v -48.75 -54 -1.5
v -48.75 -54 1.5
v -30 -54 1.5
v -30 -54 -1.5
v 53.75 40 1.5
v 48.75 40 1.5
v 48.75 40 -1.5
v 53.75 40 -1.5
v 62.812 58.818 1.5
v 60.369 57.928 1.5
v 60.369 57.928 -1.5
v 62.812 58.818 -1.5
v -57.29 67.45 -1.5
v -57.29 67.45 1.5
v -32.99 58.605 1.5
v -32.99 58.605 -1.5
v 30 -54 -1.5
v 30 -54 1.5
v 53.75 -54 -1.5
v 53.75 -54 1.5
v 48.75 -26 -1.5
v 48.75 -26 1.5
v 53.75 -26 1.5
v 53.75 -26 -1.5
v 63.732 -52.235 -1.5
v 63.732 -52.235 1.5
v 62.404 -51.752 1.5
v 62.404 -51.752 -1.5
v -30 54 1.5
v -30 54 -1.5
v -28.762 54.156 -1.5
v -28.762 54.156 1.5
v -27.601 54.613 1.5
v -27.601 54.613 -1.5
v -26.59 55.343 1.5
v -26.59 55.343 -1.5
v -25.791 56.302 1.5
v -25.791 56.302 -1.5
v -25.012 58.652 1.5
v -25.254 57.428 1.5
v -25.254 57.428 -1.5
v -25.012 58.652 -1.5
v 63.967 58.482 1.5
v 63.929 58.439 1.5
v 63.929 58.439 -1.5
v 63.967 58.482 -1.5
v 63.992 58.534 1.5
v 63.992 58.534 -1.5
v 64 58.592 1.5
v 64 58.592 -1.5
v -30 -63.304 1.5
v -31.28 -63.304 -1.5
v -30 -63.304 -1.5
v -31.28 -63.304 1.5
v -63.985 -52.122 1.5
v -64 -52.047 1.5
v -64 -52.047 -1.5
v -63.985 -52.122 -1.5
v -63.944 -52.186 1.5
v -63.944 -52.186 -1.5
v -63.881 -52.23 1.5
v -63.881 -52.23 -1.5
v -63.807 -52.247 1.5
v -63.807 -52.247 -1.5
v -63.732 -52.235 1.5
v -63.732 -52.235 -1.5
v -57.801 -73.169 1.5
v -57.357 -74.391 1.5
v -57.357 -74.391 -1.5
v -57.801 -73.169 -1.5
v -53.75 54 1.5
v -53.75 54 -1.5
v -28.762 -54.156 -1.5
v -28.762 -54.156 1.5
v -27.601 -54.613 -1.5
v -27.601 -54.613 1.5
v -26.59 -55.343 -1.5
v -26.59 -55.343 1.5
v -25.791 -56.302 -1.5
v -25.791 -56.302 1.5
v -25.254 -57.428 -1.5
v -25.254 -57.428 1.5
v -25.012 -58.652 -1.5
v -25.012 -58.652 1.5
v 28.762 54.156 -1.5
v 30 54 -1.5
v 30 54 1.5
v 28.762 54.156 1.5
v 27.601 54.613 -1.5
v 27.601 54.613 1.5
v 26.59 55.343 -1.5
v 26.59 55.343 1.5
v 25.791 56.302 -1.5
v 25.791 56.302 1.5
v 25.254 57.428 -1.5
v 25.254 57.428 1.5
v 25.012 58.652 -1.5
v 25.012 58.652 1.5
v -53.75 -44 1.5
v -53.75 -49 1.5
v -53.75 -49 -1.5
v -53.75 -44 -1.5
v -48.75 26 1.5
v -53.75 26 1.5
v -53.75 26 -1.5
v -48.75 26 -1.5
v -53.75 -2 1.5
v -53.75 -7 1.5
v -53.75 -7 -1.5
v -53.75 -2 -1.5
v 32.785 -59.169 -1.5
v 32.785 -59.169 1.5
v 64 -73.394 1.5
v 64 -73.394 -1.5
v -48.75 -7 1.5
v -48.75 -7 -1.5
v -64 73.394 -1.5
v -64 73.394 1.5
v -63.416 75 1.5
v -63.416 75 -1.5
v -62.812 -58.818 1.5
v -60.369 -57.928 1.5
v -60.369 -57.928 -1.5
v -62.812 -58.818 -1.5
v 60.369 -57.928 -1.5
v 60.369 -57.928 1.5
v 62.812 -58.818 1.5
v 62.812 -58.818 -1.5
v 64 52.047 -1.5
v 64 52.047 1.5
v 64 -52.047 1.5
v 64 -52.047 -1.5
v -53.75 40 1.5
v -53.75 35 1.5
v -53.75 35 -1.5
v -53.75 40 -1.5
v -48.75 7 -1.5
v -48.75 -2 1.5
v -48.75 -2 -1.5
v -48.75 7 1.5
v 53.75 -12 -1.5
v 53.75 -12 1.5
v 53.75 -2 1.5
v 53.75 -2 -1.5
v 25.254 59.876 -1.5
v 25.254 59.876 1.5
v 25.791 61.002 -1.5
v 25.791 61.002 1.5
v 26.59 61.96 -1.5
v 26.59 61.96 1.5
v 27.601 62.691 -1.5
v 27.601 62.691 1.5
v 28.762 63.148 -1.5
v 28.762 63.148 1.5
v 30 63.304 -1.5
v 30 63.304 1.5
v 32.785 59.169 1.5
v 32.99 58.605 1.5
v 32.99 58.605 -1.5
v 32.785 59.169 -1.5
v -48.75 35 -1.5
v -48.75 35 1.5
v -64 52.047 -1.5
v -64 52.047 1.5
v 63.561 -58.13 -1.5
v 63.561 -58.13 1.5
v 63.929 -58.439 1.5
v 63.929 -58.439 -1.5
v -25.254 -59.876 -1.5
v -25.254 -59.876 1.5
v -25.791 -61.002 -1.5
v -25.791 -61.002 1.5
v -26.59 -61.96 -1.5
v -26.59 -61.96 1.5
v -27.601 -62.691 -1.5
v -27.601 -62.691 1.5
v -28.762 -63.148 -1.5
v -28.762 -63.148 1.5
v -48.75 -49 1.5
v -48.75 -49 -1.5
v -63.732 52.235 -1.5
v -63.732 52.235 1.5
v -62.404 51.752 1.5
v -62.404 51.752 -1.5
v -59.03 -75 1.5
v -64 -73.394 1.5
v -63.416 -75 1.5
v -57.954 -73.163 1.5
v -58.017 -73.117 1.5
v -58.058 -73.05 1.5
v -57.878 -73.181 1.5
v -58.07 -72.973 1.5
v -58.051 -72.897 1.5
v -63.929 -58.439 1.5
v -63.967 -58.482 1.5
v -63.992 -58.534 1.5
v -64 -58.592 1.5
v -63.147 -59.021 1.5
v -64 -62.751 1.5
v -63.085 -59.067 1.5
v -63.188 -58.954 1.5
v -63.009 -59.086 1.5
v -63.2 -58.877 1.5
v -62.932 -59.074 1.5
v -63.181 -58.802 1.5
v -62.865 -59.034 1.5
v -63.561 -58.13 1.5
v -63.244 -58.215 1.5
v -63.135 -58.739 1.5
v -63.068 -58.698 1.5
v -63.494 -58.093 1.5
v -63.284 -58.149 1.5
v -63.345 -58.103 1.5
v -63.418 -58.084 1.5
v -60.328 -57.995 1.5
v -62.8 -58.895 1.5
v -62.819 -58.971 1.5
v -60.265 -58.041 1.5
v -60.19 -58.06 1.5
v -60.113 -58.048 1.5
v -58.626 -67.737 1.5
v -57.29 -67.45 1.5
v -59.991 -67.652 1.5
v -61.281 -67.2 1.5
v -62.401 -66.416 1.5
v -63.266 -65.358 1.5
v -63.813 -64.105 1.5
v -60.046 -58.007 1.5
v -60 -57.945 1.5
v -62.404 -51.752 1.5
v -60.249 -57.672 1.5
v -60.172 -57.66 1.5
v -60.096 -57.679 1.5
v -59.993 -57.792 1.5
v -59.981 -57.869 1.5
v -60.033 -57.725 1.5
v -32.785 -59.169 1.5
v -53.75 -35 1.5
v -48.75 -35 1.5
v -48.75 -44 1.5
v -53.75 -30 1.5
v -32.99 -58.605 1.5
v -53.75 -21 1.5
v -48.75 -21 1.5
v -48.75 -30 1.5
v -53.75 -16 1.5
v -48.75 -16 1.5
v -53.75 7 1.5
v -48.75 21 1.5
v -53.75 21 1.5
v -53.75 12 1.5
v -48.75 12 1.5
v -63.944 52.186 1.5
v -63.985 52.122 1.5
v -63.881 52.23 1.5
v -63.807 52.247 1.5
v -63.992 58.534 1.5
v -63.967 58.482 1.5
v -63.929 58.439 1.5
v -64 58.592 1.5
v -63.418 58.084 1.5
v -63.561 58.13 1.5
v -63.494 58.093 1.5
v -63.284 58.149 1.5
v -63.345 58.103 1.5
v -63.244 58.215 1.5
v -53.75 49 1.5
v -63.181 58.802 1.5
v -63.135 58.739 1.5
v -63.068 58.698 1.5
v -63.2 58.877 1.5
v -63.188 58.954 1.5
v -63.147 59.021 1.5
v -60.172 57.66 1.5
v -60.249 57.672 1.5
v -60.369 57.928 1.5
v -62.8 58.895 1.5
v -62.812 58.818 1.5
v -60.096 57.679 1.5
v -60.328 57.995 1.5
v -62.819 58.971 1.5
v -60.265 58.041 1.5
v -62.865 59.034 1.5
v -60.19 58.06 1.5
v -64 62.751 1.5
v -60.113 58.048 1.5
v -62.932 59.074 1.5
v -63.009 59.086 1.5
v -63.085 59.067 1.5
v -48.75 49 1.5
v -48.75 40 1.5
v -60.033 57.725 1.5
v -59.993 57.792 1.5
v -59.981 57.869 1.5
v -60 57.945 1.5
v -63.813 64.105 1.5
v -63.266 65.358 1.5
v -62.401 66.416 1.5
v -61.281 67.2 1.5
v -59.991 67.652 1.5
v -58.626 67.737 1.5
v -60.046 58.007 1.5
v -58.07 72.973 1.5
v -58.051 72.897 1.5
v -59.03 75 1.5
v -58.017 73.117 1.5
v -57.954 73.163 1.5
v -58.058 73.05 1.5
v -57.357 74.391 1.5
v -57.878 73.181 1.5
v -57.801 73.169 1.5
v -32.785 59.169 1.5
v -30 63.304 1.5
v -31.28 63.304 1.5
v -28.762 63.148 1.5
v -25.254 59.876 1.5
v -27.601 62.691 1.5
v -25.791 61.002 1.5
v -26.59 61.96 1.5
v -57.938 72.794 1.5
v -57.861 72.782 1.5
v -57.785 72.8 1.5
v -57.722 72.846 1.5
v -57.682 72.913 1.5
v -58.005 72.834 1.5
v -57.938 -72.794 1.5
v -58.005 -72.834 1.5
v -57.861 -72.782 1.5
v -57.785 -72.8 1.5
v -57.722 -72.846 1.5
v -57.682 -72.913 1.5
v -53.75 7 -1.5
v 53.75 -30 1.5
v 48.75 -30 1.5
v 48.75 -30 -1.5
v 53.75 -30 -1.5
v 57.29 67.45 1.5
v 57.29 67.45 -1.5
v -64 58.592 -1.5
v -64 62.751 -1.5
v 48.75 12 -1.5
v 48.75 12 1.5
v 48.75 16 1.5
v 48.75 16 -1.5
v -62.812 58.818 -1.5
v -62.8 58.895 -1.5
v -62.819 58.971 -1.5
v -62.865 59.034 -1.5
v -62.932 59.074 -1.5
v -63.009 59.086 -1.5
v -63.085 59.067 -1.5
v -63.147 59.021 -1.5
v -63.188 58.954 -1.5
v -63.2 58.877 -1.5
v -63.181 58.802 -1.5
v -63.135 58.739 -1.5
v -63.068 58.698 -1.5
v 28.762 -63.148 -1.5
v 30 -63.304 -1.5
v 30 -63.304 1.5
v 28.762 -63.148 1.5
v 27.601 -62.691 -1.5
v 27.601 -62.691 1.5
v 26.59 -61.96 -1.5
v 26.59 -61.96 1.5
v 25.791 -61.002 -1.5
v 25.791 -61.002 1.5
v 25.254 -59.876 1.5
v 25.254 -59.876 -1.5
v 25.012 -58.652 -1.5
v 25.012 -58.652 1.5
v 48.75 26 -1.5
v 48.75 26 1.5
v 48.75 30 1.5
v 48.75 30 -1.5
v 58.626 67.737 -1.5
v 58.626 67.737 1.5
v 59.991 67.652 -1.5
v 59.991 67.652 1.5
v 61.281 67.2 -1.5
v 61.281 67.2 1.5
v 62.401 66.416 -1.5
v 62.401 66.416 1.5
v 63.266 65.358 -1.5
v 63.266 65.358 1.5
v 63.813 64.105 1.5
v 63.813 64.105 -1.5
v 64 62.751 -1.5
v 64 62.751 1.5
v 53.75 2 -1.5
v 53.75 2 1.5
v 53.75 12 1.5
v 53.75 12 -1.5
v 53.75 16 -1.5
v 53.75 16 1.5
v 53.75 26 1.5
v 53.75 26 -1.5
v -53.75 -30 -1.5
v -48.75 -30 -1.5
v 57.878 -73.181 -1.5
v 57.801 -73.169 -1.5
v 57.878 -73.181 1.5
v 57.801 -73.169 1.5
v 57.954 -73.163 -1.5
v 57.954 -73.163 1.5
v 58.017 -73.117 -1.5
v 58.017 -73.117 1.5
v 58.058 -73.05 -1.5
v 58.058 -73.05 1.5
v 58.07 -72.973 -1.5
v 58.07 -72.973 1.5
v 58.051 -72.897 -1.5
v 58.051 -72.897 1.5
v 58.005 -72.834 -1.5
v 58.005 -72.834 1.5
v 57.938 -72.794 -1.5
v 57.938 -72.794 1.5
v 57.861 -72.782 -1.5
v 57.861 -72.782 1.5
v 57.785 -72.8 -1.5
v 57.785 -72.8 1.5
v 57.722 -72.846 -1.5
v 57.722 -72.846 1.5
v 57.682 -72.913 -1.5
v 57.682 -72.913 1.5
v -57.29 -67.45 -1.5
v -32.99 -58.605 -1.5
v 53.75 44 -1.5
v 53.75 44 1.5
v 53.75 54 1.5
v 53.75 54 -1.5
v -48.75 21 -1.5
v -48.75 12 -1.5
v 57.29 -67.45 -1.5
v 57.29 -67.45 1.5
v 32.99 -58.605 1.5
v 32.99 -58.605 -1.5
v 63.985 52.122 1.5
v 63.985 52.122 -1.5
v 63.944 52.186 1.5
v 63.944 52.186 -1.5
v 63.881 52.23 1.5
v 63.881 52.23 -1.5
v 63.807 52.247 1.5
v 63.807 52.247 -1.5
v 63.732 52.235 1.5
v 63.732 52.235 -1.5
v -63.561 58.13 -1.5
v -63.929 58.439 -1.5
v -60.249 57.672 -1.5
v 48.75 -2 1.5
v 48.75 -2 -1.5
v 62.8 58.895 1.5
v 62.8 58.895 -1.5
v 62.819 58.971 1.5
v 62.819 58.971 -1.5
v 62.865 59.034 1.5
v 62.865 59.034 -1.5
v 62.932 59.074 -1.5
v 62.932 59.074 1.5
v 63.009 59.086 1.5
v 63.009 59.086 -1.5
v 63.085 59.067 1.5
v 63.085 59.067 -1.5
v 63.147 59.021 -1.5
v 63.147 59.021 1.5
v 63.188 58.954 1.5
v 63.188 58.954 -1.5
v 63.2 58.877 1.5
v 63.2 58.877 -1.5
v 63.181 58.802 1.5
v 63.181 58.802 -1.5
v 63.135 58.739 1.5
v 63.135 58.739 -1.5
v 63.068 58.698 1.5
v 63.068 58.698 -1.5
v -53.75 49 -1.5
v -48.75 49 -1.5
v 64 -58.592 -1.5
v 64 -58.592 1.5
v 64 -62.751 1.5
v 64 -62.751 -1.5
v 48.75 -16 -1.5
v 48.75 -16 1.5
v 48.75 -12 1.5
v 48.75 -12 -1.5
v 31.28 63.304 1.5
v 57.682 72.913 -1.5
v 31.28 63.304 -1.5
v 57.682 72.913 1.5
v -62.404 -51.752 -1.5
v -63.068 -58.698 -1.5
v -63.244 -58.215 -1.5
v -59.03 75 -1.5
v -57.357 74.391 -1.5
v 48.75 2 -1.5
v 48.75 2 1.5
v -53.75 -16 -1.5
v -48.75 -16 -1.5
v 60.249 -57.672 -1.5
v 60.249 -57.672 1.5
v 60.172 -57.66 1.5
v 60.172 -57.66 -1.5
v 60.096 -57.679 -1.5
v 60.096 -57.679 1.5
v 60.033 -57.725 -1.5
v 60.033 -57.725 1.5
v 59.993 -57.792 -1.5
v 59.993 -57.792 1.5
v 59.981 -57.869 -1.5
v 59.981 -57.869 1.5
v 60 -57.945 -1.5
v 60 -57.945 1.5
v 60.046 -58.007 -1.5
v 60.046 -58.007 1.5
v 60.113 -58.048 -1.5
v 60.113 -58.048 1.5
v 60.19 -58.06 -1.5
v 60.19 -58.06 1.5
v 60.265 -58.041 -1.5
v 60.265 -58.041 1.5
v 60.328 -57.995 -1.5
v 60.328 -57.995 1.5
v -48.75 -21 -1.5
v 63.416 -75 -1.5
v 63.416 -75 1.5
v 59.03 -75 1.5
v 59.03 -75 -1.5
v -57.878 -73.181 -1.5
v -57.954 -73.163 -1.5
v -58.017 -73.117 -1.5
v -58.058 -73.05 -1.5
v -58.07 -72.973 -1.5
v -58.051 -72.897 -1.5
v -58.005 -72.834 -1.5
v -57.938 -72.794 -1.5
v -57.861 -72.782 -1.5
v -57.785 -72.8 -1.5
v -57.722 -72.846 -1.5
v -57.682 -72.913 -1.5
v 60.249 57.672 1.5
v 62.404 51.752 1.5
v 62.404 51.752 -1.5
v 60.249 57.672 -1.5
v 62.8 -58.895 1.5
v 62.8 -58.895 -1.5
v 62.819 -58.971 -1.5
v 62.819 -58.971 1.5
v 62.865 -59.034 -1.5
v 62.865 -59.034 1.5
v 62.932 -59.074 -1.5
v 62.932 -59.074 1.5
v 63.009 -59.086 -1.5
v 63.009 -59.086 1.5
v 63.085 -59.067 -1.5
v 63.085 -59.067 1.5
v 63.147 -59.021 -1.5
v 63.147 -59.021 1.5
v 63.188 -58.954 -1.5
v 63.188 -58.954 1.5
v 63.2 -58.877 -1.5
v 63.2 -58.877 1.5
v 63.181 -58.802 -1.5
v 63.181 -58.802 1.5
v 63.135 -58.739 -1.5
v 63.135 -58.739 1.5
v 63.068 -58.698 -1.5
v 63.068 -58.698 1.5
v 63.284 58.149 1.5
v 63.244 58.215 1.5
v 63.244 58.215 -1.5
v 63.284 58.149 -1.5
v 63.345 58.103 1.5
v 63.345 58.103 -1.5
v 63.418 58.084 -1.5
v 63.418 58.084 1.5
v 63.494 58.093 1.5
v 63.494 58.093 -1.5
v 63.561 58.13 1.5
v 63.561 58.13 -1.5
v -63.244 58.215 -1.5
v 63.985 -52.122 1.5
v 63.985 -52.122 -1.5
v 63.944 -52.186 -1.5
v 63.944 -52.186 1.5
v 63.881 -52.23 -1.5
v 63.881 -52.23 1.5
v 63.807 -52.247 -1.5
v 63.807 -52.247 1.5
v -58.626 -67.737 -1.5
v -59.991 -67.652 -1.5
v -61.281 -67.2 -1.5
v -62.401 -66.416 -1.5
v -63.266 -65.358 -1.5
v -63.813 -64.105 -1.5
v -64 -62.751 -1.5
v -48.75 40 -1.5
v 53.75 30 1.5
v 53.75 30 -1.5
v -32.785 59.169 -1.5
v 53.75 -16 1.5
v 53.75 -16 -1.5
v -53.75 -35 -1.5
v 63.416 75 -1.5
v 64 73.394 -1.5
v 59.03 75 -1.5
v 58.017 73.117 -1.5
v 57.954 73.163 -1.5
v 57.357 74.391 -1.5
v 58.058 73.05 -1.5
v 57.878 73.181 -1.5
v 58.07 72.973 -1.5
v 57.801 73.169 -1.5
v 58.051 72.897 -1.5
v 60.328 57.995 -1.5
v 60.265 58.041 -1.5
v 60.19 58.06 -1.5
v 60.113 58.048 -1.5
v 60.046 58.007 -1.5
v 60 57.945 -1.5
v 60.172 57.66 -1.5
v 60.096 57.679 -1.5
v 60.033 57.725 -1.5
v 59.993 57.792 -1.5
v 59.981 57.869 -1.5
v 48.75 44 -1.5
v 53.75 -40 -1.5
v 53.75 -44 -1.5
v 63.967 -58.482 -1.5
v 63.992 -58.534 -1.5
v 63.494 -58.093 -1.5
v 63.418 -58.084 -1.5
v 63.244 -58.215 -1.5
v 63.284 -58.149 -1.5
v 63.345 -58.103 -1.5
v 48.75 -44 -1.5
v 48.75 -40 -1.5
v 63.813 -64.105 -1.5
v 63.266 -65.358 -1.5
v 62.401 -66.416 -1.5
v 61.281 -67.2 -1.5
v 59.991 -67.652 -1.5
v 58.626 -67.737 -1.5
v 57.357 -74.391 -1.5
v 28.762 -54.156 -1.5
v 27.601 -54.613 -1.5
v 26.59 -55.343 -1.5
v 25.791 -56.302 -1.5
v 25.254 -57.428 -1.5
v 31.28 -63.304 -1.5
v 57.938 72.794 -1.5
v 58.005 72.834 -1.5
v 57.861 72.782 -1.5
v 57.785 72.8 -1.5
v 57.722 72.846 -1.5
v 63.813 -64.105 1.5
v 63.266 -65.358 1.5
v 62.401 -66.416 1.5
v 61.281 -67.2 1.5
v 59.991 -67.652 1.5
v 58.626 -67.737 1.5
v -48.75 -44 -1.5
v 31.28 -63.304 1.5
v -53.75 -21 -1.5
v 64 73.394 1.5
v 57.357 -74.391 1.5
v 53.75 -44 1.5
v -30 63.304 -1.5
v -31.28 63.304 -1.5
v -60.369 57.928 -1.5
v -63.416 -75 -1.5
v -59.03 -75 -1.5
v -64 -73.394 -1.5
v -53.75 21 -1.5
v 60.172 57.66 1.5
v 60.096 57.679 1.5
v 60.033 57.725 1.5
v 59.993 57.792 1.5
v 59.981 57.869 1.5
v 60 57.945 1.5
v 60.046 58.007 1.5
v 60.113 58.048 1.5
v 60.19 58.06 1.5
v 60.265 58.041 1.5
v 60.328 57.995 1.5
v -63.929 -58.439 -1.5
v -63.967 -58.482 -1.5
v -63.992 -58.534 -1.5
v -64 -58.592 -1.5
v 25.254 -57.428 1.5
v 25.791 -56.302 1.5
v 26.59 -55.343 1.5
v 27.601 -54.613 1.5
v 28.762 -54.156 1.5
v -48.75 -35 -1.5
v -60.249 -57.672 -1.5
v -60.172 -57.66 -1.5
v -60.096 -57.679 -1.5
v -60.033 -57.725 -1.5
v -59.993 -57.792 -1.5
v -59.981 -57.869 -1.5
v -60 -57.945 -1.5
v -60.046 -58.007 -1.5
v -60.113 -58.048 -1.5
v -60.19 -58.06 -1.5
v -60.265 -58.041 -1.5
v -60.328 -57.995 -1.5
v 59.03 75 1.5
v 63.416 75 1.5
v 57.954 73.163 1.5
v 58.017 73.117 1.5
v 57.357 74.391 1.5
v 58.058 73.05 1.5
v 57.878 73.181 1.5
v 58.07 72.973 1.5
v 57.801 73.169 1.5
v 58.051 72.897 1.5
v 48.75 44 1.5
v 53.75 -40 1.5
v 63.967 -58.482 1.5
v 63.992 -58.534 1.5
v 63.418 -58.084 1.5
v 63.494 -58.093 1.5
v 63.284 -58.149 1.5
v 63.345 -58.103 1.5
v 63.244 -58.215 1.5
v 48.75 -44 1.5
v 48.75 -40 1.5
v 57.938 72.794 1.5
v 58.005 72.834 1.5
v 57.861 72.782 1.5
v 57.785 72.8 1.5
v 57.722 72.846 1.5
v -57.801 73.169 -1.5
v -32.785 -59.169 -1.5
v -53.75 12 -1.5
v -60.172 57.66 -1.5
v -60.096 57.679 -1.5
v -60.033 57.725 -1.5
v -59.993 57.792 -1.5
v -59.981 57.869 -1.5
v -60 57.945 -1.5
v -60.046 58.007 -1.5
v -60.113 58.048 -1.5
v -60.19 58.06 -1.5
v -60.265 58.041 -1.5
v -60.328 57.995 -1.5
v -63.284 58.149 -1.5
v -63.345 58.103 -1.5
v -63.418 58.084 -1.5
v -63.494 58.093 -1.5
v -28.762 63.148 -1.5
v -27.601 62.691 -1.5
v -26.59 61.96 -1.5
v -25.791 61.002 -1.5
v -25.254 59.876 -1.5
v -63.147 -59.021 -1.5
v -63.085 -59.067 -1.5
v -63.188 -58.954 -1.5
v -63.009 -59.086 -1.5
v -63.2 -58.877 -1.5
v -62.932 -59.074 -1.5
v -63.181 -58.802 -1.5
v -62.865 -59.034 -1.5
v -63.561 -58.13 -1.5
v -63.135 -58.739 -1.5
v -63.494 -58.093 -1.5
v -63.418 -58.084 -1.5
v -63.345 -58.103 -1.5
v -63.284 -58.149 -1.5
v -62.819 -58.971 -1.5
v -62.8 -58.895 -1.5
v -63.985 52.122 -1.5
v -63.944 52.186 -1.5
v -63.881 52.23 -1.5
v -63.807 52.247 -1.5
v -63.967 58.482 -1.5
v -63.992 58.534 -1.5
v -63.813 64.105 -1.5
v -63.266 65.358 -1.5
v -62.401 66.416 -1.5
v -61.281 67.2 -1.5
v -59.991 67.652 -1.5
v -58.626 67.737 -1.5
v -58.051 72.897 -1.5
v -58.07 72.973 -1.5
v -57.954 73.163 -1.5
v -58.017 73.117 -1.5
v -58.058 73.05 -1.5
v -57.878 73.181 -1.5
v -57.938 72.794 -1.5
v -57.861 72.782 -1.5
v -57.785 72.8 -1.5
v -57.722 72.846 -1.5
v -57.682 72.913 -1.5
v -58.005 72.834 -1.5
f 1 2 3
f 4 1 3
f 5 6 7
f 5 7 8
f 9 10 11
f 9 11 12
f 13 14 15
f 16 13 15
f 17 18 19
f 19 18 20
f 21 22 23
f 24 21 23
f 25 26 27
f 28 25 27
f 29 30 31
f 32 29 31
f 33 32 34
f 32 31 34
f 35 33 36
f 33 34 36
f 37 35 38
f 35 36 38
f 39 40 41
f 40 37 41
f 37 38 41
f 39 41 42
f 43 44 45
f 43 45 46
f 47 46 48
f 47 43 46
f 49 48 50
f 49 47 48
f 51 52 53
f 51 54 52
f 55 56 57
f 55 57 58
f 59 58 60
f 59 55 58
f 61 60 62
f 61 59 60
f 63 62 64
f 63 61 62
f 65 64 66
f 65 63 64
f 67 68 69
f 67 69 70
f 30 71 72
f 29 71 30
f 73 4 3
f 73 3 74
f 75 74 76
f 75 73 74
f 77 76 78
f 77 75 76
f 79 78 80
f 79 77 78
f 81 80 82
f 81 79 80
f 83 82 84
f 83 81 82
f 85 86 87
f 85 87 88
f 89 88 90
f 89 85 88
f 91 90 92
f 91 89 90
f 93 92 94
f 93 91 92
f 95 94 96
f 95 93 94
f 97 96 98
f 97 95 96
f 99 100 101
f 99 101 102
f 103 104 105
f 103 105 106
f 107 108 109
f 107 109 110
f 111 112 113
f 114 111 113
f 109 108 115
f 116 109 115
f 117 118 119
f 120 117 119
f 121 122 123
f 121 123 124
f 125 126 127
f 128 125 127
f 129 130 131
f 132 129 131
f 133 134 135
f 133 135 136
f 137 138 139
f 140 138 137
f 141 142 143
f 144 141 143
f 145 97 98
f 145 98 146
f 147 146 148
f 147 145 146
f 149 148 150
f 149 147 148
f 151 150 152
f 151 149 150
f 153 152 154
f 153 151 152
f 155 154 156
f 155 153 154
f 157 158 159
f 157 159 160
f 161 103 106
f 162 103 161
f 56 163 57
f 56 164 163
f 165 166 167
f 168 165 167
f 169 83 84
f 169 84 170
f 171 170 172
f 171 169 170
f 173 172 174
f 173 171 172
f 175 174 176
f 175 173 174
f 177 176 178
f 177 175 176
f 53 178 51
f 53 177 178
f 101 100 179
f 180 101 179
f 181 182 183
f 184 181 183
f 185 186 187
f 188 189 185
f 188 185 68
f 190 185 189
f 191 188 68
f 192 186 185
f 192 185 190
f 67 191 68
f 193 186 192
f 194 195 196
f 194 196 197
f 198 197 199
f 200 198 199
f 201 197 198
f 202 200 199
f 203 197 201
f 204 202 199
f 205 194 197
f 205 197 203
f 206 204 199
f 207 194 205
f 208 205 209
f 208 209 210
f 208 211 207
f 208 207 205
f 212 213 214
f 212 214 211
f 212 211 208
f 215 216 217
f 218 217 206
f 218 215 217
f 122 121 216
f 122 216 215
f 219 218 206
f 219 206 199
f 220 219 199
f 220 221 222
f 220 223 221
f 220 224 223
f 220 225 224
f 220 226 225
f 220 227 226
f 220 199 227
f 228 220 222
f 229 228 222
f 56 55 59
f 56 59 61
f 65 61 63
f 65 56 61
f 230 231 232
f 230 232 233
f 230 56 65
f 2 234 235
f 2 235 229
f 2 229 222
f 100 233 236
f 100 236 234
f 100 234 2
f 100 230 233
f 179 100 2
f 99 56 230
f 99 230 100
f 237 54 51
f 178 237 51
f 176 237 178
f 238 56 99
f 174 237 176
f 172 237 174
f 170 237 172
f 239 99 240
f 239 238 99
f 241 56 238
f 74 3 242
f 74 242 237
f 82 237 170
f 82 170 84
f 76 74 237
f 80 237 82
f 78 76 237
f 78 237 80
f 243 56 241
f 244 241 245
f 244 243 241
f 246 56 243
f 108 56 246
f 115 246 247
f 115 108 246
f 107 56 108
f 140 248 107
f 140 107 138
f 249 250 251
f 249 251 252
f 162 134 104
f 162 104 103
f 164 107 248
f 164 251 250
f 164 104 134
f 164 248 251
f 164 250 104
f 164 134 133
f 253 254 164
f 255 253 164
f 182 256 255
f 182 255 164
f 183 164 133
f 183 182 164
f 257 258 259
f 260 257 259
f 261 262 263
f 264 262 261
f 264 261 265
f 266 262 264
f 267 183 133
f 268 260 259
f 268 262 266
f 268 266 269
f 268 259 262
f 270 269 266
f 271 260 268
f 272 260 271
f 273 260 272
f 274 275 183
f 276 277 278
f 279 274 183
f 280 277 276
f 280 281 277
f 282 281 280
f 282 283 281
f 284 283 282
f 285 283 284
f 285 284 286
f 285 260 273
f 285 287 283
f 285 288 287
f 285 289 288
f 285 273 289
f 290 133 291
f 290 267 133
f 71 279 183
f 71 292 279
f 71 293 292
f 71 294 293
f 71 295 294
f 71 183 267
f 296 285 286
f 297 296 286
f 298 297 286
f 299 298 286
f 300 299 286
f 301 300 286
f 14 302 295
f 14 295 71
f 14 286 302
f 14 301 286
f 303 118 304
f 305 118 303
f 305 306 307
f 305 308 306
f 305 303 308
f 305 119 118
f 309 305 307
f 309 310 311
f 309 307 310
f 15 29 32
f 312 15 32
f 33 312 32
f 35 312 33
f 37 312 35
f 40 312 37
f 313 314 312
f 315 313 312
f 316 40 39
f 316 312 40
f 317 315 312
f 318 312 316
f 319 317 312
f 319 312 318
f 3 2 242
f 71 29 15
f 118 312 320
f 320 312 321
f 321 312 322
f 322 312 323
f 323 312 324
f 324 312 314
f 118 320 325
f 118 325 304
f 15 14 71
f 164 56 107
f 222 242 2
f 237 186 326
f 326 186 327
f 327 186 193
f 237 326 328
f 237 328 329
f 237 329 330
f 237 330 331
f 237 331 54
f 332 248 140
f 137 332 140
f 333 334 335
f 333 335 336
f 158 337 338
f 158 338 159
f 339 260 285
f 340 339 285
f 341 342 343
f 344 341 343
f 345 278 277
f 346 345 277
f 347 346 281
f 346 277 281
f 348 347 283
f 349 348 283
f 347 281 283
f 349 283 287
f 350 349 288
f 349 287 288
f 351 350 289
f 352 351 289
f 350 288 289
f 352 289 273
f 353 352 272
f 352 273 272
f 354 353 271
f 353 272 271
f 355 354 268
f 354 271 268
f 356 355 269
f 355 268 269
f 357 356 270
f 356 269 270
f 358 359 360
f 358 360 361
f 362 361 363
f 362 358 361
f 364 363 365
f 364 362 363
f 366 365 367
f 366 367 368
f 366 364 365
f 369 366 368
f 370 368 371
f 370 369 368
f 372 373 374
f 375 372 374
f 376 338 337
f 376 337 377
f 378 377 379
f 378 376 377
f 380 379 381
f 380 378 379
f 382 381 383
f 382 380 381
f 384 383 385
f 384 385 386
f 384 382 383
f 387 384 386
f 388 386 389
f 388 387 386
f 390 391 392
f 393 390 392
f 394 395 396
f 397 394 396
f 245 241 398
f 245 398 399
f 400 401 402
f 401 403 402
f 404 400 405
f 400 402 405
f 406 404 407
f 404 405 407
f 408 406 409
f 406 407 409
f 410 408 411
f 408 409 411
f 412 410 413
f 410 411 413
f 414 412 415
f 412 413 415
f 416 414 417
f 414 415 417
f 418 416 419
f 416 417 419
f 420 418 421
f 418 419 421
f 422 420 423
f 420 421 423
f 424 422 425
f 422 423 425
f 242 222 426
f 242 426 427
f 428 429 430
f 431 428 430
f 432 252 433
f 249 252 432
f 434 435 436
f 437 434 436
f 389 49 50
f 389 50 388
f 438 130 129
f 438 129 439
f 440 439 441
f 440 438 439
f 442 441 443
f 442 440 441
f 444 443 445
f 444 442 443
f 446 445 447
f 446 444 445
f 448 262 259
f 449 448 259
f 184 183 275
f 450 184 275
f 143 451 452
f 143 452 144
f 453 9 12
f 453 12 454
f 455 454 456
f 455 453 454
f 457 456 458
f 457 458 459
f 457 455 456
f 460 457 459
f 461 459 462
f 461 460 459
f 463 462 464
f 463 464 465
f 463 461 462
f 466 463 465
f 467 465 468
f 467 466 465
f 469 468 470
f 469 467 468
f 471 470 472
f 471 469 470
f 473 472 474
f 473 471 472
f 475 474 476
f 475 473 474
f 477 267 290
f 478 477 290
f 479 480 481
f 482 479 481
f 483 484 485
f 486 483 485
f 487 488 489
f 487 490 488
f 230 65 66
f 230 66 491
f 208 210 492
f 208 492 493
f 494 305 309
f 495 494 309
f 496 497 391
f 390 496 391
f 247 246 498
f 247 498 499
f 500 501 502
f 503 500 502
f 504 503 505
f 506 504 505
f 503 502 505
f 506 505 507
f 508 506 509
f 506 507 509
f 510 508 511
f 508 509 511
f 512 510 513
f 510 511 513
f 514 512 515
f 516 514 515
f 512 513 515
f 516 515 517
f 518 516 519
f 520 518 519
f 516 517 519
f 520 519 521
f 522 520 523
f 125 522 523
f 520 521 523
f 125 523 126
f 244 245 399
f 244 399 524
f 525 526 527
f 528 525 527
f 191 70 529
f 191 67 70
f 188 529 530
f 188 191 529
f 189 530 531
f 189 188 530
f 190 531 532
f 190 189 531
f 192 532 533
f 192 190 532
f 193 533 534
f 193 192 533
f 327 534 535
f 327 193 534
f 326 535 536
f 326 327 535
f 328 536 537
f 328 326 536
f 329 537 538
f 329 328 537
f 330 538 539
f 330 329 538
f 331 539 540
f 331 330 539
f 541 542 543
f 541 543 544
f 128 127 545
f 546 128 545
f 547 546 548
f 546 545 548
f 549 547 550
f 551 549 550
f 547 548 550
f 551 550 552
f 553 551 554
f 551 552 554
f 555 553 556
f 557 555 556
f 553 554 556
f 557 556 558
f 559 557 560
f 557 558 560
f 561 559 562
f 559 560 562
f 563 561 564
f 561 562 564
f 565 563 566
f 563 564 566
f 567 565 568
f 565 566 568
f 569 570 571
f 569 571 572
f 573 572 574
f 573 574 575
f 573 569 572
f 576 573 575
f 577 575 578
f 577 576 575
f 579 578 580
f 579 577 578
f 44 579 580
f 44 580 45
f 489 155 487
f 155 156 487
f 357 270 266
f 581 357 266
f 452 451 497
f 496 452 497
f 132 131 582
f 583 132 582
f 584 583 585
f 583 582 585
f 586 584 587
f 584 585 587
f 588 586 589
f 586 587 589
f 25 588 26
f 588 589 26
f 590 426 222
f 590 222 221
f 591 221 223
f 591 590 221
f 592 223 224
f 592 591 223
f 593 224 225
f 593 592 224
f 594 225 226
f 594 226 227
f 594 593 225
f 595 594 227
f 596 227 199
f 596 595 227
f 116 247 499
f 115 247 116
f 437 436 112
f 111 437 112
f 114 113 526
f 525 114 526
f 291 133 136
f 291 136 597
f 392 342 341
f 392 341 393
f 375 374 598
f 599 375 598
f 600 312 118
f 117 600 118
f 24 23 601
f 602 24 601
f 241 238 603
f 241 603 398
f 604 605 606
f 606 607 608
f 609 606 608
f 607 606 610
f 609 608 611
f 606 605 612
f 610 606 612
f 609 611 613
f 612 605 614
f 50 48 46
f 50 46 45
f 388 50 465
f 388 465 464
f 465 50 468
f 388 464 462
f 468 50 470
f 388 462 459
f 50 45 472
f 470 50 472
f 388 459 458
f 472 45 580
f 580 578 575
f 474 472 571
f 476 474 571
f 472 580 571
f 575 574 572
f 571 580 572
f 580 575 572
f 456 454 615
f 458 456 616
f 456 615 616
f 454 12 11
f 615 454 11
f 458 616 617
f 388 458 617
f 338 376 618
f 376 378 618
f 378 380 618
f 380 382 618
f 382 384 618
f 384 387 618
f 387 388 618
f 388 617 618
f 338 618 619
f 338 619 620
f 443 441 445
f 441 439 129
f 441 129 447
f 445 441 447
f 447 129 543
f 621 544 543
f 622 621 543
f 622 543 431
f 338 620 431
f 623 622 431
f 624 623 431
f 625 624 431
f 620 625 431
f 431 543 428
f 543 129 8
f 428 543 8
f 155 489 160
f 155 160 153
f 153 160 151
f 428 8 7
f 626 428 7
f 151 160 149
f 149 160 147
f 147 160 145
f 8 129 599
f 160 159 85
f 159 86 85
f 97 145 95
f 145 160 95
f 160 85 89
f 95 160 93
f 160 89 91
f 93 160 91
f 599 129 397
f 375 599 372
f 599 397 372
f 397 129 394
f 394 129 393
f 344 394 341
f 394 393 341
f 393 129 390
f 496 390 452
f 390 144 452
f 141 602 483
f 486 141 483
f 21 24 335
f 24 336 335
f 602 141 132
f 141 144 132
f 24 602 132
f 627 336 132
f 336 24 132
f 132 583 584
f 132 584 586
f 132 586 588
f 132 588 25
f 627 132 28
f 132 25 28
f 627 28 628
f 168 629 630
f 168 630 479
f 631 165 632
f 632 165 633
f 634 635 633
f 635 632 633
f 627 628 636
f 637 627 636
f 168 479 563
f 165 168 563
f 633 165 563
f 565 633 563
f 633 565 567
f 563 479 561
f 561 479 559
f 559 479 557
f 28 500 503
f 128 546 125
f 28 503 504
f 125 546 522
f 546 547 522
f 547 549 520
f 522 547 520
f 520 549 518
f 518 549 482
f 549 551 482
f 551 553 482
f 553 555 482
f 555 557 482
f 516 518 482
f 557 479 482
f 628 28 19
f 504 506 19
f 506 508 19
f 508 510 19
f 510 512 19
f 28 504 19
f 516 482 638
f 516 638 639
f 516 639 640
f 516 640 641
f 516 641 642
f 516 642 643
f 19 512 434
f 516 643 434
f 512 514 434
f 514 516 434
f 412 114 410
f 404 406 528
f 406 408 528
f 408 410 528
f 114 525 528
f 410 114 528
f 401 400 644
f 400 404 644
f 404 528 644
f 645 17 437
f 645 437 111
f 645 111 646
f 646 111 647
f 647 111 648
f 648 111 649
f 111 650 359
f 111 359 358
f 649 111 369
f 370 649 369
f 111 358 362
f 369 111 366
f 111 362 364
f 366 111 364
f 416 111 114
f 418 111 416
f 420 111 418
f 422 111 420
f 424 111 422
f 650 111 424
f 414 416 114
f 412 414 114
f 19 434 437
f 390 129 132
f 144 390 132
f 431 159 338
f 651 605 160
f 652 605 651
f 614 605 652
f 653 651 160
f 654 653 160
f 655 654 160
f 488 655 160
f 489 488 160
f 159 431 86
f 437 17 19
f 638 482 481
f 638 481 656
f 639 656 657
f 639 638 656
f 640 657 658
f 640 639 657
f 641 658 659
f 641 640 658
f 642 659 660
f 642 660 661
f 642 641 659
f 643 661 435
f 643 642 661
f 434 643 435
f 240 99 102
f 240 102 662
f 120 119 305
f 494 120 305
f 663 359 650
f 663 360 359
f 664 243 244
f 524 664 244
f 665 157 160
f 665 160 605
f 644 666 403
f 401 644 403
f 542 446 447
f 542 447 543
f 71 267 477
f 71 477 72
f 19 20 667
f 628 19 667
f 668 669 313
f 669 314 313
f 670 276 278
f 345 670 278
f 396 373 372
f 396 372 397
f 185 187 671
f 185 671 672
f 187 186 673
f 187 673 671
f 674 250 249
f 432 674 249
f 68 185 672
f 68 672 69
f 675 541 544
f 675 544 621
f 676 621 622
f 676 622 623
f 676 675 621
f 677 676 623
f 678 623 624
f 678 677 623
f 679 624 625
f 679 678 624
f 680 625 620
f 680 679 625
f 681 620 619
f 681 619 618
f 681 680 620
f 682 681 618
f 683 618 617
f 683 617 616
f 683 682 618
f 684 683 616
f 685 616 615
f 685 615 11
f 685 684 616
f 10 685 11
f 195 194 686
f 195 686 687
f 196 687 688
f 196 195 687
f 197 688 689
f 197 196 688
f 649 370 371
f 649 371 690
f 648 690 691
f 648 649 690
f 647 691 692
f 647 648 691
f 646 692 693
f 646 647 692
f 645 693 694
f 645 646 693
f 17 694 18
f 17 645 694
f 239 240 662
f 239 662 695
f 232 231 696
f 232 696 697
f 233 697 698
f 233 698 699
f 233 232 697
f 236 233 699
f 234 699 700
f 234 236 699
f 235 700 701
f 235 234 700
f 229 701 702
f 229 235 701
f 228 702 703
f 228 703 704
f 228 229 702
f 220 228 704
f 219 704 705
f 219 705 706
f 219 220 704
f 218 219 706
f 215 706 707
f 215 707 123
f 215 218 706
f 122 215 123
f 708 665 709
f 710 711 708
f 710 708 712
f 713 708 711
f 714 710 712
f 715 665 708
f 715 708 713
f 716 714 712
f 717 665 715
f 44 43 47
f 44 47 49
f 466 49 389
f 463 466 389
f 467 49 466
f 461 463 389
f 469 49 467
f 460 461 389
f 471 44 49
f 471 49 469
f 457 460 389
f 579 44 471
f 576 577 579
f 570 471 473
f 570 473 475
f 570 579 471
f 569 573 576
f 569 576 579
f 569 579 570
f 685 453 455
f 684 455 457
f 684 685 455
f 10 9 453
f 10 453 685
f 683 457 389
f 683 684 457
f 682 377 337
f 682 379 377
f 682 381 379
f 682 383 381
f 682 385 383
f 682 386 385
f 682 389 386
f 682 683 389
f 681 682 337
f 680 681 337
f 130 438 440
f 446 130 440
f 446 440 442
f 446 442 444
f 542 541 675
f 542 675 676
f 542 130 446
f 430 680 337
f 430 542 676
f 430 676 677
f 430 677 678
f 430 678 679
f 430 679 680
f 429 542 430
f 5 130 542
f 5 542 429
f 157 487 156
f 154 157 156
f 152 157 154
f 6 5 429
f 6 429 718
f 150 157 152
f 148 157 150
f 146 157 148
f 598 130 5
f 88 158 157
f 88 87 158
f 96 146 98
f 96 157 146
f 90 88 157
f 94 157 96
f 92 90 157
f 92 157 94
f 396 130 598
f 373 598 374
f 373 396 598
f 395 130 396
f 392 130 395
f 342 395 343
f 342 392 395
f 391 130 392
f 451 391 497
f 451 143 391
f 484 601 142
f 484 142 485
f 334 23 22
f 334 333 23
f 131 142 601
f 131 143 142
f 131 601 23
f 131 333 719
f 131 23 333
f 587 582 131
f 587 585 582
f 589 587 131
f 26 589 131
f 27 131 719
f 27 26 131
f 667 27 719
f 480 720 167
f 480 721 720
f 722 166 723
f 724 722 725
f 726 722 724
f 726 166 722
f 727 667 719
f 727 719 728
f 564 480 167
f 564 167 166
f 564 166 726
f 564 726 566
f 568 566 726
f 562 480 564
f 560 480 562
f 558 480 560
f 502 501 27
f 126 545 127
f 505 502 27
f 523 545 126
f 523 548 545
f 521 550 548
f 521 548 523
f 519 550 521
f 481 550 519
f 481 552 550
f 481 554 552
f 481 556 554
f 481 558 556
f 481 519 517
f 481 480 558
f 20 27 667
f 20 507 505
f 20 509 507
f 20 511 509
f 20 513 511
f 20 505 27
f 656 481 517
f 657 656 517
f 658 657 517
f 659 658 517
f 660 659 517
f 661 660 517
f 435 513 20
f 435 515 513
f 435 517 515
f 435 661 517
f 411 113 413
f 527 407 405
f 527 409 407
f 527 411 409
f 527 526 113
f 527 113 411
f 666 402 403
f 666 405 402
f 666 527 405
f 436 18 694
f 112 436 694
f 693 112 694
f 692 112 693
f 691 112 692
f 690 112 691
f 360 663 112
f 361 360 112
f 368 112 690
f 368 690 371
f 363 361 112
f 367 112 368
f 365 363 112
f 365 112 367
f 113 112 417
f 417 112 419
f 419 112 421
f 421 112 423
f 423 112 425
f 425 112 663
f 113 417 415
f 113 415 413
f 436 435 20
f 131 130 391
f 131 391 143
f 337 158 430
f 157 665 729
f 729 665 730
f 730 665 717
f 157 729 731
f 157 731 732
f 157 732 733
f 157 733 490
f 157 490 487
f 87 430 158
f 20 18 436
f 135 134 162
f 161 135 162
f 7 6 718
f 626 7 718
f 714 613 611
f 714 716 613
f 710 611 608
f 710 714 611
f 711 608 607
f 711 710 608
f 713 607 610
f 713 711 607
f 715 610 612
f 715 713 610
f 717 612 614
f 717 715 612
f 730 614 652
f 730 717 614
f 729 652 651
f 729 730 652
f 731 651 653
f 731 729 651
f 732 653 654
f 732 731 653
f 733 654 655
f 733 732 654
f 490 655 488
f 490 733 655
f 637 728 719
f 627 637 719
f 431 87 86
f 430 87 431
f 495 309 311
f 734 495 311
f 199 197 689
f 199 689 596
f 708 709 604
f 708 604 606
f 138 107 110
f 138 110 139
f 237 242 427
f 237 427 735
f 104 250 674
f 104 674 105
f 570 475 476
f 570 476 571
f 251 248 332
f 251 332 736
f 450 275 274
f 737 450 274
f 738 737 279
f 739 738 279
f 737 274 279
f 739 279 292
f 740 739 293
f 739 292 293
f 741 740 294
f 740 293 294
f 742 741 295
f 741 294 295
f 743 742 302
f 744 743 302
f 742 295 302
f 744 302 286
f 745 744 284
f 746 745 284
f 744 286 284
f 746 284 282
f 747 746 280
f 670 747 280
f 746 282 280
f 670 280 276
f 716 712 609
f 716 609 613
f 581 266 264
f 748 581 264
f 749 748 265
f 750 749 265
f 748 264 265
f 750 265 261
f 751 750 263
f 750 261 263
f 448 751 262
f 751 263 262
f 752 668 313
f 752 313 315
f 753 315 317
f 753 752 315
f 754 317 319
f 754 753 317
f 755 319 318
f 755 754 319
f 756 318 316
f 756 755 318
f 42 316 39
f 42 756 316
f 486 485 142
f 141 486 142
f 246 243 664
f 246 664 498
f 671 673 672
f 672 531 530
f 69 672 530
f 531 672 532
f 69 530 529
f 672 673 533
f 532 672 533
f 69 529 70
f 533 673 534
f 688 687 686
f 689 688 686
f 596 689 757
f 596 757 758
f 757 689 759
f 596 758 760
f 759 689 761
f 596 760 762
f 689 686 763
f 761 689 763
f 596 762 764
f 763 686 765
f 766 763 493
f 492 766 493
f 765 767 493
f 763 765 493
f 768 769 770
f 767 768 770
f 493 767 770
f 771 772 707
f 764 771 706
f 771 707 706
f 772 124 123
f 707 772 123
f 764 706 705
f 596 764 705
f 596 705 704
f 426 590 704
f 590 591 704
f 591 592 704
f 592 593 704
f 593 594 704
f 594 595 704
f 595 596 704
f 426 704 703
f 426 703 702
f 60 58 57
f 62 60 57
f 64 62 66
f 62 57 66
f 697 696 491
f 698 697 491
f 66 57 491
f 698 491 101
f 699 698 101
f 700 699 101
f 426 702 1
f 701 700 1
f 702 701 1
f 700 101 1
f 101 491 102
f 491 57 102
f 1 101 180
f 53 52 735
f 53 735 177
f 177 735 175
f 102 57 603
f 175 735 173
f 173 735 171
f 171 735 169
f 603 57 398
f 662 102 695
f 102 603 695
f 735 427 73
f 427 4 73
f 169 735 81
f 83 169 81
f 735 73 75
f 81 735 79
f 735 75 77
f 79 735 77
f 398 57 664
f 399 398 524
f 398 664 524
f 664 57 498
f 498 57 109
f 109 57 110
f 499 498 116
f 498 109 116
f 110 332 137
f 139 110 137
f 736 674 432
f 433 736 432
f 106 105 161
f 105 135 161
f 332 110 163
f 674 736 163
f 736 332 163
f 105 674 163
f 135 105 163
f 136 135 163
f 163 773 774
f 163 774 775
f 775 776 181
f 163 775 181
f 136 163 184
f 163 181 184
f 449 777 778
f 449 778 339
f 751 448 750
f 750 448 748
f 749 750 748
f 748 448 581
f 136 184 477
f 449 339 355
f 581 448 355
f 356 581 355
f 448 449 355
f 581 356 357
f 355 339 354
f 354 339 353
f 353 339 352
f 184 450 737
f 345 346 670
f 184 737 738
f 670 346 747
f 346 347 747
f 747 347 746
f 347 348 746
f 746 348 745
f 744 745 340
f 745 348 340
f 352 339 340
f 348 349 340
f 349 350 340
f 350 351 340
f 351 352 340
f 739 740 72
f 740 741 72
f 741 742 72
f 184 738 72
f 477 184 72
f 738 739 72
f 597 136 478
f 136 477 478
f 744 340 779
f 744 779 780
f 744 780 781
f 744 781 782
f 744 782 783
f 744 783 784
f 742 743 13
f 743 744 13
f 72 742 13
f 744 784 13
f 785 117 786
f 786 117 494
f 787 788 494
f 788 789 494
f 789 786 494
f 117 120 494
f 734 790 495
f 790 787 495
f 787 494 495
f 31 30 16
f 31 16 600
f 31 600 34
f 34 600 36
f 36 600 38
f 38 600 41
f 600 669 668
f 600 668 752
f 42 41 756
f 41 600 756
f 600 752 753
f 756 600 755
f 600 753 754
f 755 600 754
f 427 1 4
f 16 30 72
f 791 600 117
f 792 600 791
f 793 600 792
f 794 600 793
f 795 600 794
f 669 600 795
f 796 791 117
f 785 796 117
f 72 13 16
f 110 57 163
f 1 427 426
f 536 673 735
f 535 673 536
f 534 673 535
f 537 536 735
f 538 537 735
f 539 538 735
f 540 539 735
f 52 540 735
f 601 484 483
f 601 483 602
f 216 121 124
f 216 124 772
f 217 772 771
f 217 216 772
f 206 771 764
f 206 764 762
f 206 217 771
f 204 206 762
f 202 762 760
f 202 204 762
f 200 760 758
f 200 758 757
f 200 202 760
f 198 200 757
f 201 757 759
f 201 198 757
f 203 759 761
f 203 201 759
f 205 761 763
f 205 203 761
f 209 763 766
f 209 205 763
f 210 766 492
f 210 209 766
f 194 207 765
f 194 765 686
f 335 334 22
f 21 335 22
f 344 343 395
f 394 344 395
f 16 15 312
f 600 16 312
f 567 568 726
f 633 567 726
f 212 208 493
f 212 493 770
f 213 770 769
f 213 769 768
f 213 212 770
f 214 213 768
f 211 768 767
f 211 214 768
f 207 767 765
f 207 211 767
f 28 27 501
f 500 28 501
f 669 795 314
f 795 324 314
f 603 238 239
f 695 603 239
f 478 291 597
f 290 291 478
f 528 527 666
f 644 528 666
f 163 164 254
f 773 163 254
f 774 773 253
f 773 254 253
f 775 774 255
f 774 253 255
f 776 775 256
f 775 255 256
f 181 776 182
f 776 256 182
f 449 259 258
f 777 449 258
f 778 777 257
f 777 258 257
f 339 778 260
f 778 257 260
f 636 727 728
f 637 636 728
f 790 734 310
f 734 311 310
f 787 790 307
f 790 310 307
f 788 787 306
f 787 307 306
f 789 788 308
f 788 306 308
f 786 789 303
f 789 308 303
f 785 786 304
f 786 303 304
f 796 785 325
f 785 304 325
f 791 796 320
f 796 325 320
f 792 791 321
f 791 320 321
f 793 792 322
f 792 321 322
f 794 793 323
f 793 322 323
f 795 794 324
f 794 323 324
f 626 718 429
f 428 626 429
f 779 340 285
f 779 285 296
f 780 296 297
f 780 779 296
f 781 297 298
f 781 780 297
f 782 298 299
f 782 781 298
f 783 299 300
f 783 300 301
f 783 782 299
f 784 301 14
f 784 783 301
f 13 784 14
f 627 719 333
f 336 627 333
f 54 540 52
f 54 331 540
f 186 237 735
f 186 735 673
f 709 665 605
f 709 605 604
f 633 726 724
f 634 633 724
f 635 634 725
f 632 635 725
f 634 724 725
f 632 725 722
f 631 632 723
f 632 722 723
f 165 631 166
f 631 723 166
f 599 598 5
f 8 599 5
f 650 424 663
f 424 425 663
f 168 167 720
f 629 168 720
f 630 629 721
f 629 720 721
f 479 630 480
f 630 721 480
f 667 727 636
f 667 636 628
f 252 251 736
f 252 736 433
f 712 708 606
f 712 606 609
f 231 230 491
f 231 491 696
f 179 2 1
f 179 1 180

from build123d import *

# Parameters (mm, degrees)
F1_DEPTH        = 1.5
F4_W            = 5
F4_H            = 10
F5_DEPTH        = 3
F6_W            = 23.75
F6_H            = 108
F6_W_2          = 50
F6_H_2          = 26
F7_DEPTH        = 3
F8_W            = 5
F8_H            = 5
F9_DEPTH        = 3
F10_T1_DEPTH    = 38.7037001686
F10_T3_DEPTH    = 28
F10_S1_T1_DEPTH = 38.7037001686
F10_S1_T3_DEPTH = 28


# Not quite as in the source:
# - a fillet or chamfer that OpenCascade refuses, or shapes differently, is made with other operations: its cross-section is extruded or revolved along the edge and cut away or added
# - a feature names something its author has since deleted; it is built from what else it names


with BuildPart() as f1:
    # F0 (on Top) → F1 (new body, symmetric)
    with BuildSketch(Plane.XY):
        with BuildLine():
            Line((31.2800427974, 63.3035998776), (0, 63.3035998776))
            Line((0, 63.3035998776), (0, 0))
            Line((0, 0), (64, 0))
            Line((64, 0), (64, 52.0472386562))
            ThreePointArc((64, 52.0472386562), (63.9147152873, 52.211069065), (63.7315959713, 52.2351771803))
            Line((63.7315959713, 52.2351771803), (62.4040530693, 51.7519910793))
            Line((62.4040530693, 51.7519910793), (60.2493261663, 57.6720545902))
            ThreePointArc((60.2493261663, 57.6720545902), (59.9996605802, 57.9445167667), (60.3688606618, 57.9283971431))
            Line((60.3688606618, 57.9283971431), (62.8120614758, 58.8176495157))
            ThreePointArc((62.8120614758, 58.8176495157), (63.0845236523, 59.0673151018), (63.0684040287, 58.6981150202))
            Line((63.0684040287, 58.6981150202), (63.2443290661, 58.2147649522))
            ThreePointArc((63.2443290661, 58.2147649522), (63.3805037813, 58.0899838157), (63.5608251122, 58.1299600923))
            Line((63.5608251122, 58.1299600923), (63.9285575219, 58.4385242216))
            ThreePointArc((63.9285575219, 58.4385242216), (63.9812615574, 58.5072094579), (64, 58.5917331103))
            Line((64, 58.5917331103), (64, 69.8918015034))
            Line((64, 69.8918015034), (32.9901435141, 58.6051367736))
            Line((32.9901435141, 58.6051367736), (32.7849314281, 59.1689523461))
            Line((32.7849314281, 59.1689523461), (64, 73.3944786626))
            Line((64, 73.3944786626), (63.4156380227, 75))
            Line((63.4156380227, 75), (59.0299314225, 75))
            Line((59.0299314225, 75), (57.3566676351, 74.3909817873))
            Line((57.3566676351, 74.3909817873), (57.8012938214, 73.1693813803))
            ThreePointArc((57.8012938214, 73.1693813803), (58.0509594075, 72.8969192038), (57.681759326, 72.9130388275))
            Line((57.681759326, 72.9130388275), (31.2800427974, 63.3035998776))
        make_face()
    extrude(amount=F1_DEPTH, both=True)

    # F2: F1 across face


with BuildPart() as f1_1:
    add(f1.part)
    add(f1.part.mirror(Plane(origin=(0, 31.6517999388, 0), x_dir=(0, -1, 0), z_dir=(-1, 0, 0))))

    # F3: F1 across face


with BuildPart() as f1_2:
    add(f1_1.part)
    add(f1_1.part.mirror(Plane.XZ))

    # F4 (on face) → F5 (cut)
    with BuildSketch(Plane.XY.offset(1.5)):
        with Locations((-51.25, -49)):
            Rectangle(F4_W, F4_H)
        with Locations((-51.25, -35)):
            Rectangle(F4_W, F4_H)
        with Locations((-51.25, -21)):
            Rectangle(F4_W, F4_H)
        with Locations((-51.25, -7)):
            Rectangle(F4_W, F4_H)
        with Locations((-51.25, 7)):
            Rectangle(F4_W, F4_H)
        with Locations((-51.25, 21)):
            Rectangle(F4_W, F4_H)
        with Locations((-51.25, 35)):
            Rectangle(F4_W, F4_H)
        with Locations((51.25, -49)):
            Rectangle(F4_W, F4_H)
        with Locations((51.25, -35)):
            Rectangle(F4_W, F4_H)
        with Locations((51.25, -21)):
            Rectangle(F4_W, F4_H)
        with Locations((51.25, -7)):
            Rectangle(F4_W, F4_H)
        with Locations((51.25, 7)):
            Rectangle(F4_W, F4_H)
        with Locations((51.25, 21)):
            Rectangle(F4_W, F4_H)
        with Locations((51.25, 35)):
            Rectangle(F4_W, F4_H)
        with Locations((-51.25, 49)):
            Rectangle(F4_W, F4_H)
        with Locations((51.25, 49)):
            Rectangle(F4_W, F4_H)
    extrude(amount=-F5_DEPTH, mode=Mode.SUBTRACT)

    # F6 (on face) → F7 (cut)
    with BuildSketch(Plane.XY.offset(1.5)):
        with Locations((36.875, 0)):
            Rectangle(F6_W, F6_H)
        Rectangle(F6_W_2, F6_H)
        with Locations((0, 67)):
            Rectangle(F6_W_2, F6_H_2)
        with Locations((-36.875, 0)):
            Rectangle(F6_W, F6_H)
        with Locations((0, -67)):
            Rectangle(F6_W_2, F6_H_2)
    extrude(amount=-F7_DEPTH, mode=Mode.SUBTRACT)

    # F8 (on face) → F9 (join, through all)
    with BuildSketch(Plane.XY.offset(1.5)):
        with Locations((-51.25, -51.5)):
            Rectangle(F8_W, F8_H)
        with Locations((-51.25, -37.5)):
            Rectangle(F8_W, F8_H)
        with Locations((-51.25, -23.5)):
            Rectangle(F8_W, F8_H)
        with Locations((-51.25, -9.5)):
            Rectangle(F8_W, F8_H)
        with Locations((-51.25, 4.5)):
            Rectangle(F8_W, F8_H)
        with Locations((-51.25, 18.5)):
            Rectangle(F8_W, F8_H)
        with Locations((-51.25, 32.5)):
            Rectangle(F8_W, F8_H)
        with Locations((-51.25, 46.5)):
            Rectangle(F8_W, F8_H)
    extrude(amount=-F9_DEPTH)

    # F10: fillet of radius 5 on 6 edges, made by hand

    # F10_s2 → F10_t1 (cut)
    with BuildSketch(Plane.XY.offset(-19.3518500843)):
        with BuildLine():
            ThreePointArc((-64, 62.7510614697), (-61.8678821818, 66.8468216911), (-57.2898992834, 67.4495245736))
            Line((-57.2898992834, 67.4495245736), (-64, 69.8918015034))
            Line((-64, 69.8918015034), (-64, 62.7510614697))
        make_face()
        with BuildLine():
            ThreePointArc((-57.2898992834, -67.4495245736), (-61.8678821818, -66.8468216911), (-64, -62.7510614697))
            Line((-64, -62.7510614697), (-64, -69.8918015034))
            Line((-64, -69.8918015034), (-57.2898992834, -67.4495245736))
        make_face()
    extrude(amount=F10_T1_DEPTH, mode=Mode.SUBTRACT)

    # F10_s4 → F10_t3 (cut)
    with BuildSketch(Plane.XY.offset(-14)):
        with BuildLine():
            ThreePointArc((-30, 63.3035998776), (-26.4644660941, 61.8391337835), (-25, 58.3035998776))
            Line((-25, 58.3035998776), (-25, 63.3035998776))
            Line((-25, 63.3035998776), (-30, 63.3035998776))
        make_face()
        with BuildLine():
            ThreePointArc((-30, -54), (-26.4644660941, -55.4644660941), (-25, -59))
            Line((-25, -59), (-25, -54))
            Line((-25, -54), (-30, -54))
        make_face()
        with BuildLine():
            ThreePointArc((-30, 54), (-26.4644660941, 55.4644660941), (-25, 59))
            Line((-25, 59), (-25, 54))
            Line((-25, 54), (-30, 54))
        make_face()
        with BuildLine():
            ThreePointArc((-25, -58.3035998776), (-26.4644660941, -61.8391337835), (-30, -63.3035998776))
            Line((-30, -63.3035998776), (-25, -63.3035998776))
            Line((-25, -63.3035998776), (-25, -58.3035998776))
        make_face()
    extrude(amount=F10_T3_DEPTH, mode=Mode.SUBTRACT)

    # F10#s1: fillet of radius 5 on 6 edges, made by hand

    # F10_s1_s2 → F10_s1_t1 (cut)
    with BuildSketch(Plane.XY.offset(-19.3518500843)):
        with BuildLine():
            ThreePointArc((57.2898992834, 67.4495245736), (61.8678821818, 66.8468216911), (64, 62.7510614697))
            Line((64, 62.7510614697), (64, 69.8918015034))
            Line((64, 69.8918015034), (57.2898992834, 67.4495245736))
        make_face()
        with BuildLine():
            ThreePointArc((64, -62.7510614697), (61.8678821818, -66.8468216911), (57.2898992834, -67.4495245736))
            Line((57.2898992834, -67.4495245736), (64, -69.8918015034))
            Line((64, -69.8918015034), (64, -62.7510614697))
        make_face()
    extrude(amount=F10_S1_T1_DEPTH, mode=Mode.SUBTRACT)

    # F10_s1_s4 → F10_s1_t3 (cut)
    with BuildSketch(Plane.XY.offset(-14)):
        with BuildLine():
            ThreePointArc((25, 58.3035998776), (26.4644660941, 61.8391337835), (30, 63.3035998776))
            Line((30, 63.3035998776), (25, 63.3035998776))
            Line((25, 63.3035998776), (25, 58.3035998776))
        make_face()
        with BuildLine():
            ThreePointArc((30, 54), (26.4644660941, 55.4644660941), (25, 59))
            Line((25, 59), (25, 54))
            Line((25, 54), (30, 54))
        make_face()
        with BuildLine():
            ThreePointArc((25, -59), (26.4644660941, -55.4644660941), (30, -54))
            Line((30, -54), (25, -54))
            Line((25, -54), (25, -59))
        make_face()
        with BuildLine():
            ThreePointArc((30, -63.3035998776), (26.4644660941, -61.8391337835), (25, -58.3035998776))
            Line((25, -58.3035998776), (25, -63.3035998776))
            Line((25, -63.3035998776), (30, -63.3035998776))
        make_face()
    extrude(amount=F10_S1_T3_DEPTH, mode=Mode.SUBTRACT)


solid = f1_2.part
